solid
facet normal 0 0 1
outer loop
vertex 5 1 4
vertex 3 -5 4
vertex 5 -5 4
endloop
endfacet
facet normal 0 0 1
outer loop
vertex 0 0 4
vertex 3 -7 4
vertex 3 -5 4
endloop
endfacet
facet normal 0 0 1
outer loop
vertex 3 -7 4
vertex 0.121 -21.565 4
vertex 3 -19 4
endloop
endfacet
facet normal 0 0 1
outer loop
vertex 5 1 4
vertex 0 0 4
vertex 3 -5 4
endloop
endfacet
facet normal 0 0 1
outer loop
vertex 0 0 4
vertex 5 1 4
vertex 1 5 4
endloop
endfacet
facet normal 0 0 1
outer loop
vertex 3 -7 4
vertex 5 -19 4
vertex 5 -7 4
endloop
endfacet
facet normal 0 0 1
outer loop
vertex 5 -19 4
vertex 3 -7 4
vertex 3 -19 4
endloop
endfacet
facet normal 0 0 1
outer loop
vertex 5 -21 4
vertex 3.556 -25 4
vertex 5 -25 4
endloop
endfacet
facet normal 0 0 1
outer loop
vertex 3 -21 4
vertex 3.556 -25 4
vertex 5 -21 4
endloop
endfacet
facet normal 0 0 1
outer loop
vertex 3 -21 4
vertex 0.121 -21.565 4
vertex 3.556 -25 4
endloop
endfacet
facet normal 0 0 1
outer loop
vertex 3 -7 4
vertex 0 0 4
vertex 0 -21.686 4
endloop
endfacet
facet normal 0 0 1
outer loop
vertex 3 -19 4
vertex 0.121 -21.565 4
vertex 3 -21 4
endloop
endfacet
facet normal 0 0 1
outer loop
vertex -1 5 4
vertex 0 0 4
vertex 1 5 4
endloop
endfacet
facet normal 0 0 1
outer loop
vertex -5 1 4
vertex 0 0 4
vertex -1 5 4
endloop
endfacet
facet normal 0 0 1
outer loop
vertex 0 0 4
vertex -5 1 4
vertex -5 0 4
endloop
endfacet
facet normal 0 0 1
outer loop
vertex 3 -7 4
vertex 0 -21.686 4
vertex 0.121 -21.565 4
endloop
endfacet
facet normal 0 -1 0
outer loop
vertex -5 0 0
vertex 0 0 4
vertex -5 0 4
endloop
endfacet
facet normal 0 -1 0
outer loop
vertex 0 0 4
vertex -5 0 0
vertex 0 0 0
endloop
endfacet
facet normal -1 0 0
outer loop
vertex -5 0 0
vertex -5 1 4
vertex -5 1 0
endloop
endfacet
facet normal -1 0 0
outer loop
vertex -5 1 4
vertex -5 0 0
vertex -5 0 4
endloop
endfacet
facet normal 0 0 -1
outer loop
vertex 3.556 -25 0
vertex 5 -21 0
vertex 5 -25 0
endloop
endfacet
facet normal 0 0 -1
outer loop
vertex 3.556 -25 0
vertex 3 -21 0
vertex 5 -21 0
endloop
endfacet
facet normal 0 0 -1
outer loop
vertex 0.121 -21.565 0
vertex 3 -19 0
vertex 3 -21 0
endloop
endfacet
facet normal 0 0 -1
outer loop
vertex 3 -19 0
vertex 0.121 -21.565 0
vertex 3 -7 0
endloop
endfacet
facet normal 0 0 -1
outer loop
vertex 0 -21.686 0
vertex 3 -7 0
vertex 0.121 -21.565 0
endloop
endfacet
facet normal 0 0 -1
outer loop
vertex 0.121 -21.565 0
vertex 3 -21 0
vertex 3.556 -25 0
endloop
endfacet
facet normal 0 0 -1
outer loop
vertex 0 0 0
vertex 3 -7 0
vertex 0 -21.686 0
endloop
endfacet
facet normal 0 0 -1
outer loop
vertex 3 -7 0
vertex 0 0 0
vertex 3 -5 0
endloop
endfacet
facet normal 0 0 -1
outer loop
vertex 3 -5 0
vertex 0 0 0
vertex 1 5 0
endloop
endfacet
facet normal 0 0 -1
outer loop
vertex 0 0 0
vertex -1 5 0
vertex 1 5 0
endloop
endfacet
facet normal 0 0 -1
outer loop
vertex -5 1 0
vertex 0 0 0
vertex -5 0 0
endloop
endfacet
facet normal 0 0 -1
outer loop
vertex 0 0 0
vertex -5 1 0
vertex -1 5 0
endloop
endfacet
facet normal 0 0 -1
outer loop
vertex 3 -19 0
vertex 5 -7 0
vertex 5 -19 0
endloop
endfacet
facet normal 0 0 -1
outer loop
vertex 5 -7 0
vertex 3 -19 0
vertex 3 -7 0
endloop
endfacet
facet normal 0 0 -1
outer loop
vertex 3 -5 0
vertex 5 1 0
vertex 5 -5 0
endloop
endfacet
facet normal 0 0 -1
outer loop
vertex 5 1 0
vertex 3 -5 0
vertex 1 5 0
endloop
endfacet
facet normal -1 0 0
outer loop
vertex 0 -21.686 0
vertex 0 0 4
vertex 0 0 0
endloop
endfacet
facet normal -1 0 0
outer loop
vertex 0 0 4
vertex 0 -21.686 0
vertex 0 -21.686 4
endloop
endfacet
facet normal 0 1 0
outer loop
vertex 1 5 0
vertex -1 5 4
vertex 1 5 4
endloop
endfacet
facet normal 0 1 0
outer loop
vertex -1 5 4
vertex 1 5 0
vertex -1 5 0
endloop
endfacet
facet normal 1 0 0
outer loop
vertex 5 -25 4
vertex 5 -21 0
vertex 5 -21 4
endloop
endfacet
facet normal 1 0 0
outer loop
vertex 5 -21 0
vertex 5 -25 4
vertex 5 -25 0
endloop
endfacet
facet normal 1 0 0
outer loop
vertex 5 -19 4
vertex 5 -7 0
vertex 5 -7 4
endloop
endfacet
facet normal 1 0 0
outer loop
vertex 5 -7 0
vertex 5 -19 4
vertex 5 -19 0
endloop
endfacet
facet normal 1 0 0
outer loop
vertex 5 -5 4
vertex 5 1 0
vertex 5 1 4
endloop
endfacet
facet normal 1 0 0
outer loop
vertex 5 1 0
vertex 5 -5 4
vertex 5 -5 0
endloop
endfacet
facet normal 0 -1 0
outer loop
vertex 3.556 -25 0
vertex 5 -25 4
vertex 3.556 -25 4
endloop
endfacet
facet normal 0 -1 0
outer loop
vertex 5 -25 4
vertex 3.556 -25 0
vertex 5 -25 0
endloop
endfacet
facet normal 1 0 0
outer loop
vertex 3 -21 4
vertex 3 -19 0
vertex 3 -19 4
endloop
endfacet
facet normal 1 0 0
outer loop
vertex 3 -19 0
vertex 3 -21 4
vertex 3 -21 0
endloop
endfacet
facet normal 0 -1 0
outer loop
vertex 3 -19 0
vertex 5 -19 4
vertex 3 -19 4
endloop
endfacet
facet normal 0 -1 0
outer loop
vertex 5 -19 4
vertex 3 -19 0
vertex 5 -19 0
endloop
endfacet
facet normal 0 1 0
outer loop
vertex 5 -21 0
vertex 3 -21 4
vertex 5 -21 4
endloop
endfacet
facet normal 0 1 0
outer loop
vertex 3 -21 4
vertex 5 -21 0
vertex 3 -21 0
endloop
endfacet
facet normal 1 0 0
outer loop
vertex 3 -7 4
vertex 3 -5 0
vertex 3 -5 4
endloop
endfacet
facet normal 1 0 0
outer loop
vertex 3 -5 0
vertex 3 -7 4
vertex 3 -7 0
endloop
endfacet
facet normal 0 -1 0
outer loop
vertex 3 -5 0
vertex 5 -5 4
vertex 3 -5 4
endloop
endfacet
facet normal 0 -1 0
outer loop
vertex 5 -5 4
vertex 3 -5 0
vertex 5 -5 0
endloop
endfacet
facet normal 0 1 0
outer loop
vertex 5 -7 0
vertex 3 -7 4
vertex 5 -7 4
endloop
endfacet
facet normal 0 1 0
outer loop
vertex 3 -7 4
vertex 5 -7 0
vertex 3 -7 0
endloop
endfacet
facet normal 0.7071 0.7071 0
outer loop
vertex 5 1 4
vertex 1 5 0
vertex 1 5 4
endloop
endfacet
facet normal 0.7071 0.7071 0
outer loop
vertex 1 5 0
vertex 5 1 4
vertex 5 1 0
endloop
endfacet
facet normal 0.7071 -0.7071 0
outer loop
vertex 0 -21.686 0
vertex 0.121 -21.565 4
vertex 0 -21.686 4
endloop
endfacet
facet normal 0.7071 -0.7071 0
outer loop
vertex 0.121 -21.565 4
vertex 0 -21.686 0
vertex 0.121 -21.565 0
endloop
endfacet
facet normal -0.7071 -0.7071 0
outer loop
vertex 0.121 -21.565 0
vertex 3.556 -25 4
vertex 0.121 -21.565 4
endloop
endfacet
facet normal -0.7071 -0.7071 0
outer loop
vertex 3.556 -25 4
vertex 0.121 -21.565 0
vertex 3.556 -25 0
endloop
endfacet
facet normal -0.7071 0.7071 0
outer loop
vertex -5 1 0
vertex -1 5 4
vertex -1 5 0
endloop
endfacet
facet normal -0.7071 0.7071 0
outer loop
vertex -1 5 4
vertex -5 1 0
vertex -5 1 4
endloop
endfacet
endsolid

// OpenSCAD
$fn=70;   // For persion of polygons

thickness = 5;






translate([-15,15,-26]){// back to origin.
difference(){       // ejecting arm
union(){
translate([15,-15,26]){
    rotate([0,0,90]){
    cube([thickness,5,4],0);
}}
translate([15,-40,26]){
    cube([thickness,30,4],0);
}}
translate([18,-36,20]){  // knoch 1
    cube([6,2,40],0);
}
translate([18,-22,20]){  // knoch 2
    cube([6,2,40],0);
}
translate([20,-14,24]){
    rotate([0,0,45]){
    cube([thickness+6,6,9],0);
}}
translate([13,-50,-40]){
    rotate([0,0,45]){
    cube([thickness+6,8,90],0);
}}
translate([10,-14,24]){
    rotate([0,0,45]){
    cube([thickness+6,6,9],0);
}}}}
